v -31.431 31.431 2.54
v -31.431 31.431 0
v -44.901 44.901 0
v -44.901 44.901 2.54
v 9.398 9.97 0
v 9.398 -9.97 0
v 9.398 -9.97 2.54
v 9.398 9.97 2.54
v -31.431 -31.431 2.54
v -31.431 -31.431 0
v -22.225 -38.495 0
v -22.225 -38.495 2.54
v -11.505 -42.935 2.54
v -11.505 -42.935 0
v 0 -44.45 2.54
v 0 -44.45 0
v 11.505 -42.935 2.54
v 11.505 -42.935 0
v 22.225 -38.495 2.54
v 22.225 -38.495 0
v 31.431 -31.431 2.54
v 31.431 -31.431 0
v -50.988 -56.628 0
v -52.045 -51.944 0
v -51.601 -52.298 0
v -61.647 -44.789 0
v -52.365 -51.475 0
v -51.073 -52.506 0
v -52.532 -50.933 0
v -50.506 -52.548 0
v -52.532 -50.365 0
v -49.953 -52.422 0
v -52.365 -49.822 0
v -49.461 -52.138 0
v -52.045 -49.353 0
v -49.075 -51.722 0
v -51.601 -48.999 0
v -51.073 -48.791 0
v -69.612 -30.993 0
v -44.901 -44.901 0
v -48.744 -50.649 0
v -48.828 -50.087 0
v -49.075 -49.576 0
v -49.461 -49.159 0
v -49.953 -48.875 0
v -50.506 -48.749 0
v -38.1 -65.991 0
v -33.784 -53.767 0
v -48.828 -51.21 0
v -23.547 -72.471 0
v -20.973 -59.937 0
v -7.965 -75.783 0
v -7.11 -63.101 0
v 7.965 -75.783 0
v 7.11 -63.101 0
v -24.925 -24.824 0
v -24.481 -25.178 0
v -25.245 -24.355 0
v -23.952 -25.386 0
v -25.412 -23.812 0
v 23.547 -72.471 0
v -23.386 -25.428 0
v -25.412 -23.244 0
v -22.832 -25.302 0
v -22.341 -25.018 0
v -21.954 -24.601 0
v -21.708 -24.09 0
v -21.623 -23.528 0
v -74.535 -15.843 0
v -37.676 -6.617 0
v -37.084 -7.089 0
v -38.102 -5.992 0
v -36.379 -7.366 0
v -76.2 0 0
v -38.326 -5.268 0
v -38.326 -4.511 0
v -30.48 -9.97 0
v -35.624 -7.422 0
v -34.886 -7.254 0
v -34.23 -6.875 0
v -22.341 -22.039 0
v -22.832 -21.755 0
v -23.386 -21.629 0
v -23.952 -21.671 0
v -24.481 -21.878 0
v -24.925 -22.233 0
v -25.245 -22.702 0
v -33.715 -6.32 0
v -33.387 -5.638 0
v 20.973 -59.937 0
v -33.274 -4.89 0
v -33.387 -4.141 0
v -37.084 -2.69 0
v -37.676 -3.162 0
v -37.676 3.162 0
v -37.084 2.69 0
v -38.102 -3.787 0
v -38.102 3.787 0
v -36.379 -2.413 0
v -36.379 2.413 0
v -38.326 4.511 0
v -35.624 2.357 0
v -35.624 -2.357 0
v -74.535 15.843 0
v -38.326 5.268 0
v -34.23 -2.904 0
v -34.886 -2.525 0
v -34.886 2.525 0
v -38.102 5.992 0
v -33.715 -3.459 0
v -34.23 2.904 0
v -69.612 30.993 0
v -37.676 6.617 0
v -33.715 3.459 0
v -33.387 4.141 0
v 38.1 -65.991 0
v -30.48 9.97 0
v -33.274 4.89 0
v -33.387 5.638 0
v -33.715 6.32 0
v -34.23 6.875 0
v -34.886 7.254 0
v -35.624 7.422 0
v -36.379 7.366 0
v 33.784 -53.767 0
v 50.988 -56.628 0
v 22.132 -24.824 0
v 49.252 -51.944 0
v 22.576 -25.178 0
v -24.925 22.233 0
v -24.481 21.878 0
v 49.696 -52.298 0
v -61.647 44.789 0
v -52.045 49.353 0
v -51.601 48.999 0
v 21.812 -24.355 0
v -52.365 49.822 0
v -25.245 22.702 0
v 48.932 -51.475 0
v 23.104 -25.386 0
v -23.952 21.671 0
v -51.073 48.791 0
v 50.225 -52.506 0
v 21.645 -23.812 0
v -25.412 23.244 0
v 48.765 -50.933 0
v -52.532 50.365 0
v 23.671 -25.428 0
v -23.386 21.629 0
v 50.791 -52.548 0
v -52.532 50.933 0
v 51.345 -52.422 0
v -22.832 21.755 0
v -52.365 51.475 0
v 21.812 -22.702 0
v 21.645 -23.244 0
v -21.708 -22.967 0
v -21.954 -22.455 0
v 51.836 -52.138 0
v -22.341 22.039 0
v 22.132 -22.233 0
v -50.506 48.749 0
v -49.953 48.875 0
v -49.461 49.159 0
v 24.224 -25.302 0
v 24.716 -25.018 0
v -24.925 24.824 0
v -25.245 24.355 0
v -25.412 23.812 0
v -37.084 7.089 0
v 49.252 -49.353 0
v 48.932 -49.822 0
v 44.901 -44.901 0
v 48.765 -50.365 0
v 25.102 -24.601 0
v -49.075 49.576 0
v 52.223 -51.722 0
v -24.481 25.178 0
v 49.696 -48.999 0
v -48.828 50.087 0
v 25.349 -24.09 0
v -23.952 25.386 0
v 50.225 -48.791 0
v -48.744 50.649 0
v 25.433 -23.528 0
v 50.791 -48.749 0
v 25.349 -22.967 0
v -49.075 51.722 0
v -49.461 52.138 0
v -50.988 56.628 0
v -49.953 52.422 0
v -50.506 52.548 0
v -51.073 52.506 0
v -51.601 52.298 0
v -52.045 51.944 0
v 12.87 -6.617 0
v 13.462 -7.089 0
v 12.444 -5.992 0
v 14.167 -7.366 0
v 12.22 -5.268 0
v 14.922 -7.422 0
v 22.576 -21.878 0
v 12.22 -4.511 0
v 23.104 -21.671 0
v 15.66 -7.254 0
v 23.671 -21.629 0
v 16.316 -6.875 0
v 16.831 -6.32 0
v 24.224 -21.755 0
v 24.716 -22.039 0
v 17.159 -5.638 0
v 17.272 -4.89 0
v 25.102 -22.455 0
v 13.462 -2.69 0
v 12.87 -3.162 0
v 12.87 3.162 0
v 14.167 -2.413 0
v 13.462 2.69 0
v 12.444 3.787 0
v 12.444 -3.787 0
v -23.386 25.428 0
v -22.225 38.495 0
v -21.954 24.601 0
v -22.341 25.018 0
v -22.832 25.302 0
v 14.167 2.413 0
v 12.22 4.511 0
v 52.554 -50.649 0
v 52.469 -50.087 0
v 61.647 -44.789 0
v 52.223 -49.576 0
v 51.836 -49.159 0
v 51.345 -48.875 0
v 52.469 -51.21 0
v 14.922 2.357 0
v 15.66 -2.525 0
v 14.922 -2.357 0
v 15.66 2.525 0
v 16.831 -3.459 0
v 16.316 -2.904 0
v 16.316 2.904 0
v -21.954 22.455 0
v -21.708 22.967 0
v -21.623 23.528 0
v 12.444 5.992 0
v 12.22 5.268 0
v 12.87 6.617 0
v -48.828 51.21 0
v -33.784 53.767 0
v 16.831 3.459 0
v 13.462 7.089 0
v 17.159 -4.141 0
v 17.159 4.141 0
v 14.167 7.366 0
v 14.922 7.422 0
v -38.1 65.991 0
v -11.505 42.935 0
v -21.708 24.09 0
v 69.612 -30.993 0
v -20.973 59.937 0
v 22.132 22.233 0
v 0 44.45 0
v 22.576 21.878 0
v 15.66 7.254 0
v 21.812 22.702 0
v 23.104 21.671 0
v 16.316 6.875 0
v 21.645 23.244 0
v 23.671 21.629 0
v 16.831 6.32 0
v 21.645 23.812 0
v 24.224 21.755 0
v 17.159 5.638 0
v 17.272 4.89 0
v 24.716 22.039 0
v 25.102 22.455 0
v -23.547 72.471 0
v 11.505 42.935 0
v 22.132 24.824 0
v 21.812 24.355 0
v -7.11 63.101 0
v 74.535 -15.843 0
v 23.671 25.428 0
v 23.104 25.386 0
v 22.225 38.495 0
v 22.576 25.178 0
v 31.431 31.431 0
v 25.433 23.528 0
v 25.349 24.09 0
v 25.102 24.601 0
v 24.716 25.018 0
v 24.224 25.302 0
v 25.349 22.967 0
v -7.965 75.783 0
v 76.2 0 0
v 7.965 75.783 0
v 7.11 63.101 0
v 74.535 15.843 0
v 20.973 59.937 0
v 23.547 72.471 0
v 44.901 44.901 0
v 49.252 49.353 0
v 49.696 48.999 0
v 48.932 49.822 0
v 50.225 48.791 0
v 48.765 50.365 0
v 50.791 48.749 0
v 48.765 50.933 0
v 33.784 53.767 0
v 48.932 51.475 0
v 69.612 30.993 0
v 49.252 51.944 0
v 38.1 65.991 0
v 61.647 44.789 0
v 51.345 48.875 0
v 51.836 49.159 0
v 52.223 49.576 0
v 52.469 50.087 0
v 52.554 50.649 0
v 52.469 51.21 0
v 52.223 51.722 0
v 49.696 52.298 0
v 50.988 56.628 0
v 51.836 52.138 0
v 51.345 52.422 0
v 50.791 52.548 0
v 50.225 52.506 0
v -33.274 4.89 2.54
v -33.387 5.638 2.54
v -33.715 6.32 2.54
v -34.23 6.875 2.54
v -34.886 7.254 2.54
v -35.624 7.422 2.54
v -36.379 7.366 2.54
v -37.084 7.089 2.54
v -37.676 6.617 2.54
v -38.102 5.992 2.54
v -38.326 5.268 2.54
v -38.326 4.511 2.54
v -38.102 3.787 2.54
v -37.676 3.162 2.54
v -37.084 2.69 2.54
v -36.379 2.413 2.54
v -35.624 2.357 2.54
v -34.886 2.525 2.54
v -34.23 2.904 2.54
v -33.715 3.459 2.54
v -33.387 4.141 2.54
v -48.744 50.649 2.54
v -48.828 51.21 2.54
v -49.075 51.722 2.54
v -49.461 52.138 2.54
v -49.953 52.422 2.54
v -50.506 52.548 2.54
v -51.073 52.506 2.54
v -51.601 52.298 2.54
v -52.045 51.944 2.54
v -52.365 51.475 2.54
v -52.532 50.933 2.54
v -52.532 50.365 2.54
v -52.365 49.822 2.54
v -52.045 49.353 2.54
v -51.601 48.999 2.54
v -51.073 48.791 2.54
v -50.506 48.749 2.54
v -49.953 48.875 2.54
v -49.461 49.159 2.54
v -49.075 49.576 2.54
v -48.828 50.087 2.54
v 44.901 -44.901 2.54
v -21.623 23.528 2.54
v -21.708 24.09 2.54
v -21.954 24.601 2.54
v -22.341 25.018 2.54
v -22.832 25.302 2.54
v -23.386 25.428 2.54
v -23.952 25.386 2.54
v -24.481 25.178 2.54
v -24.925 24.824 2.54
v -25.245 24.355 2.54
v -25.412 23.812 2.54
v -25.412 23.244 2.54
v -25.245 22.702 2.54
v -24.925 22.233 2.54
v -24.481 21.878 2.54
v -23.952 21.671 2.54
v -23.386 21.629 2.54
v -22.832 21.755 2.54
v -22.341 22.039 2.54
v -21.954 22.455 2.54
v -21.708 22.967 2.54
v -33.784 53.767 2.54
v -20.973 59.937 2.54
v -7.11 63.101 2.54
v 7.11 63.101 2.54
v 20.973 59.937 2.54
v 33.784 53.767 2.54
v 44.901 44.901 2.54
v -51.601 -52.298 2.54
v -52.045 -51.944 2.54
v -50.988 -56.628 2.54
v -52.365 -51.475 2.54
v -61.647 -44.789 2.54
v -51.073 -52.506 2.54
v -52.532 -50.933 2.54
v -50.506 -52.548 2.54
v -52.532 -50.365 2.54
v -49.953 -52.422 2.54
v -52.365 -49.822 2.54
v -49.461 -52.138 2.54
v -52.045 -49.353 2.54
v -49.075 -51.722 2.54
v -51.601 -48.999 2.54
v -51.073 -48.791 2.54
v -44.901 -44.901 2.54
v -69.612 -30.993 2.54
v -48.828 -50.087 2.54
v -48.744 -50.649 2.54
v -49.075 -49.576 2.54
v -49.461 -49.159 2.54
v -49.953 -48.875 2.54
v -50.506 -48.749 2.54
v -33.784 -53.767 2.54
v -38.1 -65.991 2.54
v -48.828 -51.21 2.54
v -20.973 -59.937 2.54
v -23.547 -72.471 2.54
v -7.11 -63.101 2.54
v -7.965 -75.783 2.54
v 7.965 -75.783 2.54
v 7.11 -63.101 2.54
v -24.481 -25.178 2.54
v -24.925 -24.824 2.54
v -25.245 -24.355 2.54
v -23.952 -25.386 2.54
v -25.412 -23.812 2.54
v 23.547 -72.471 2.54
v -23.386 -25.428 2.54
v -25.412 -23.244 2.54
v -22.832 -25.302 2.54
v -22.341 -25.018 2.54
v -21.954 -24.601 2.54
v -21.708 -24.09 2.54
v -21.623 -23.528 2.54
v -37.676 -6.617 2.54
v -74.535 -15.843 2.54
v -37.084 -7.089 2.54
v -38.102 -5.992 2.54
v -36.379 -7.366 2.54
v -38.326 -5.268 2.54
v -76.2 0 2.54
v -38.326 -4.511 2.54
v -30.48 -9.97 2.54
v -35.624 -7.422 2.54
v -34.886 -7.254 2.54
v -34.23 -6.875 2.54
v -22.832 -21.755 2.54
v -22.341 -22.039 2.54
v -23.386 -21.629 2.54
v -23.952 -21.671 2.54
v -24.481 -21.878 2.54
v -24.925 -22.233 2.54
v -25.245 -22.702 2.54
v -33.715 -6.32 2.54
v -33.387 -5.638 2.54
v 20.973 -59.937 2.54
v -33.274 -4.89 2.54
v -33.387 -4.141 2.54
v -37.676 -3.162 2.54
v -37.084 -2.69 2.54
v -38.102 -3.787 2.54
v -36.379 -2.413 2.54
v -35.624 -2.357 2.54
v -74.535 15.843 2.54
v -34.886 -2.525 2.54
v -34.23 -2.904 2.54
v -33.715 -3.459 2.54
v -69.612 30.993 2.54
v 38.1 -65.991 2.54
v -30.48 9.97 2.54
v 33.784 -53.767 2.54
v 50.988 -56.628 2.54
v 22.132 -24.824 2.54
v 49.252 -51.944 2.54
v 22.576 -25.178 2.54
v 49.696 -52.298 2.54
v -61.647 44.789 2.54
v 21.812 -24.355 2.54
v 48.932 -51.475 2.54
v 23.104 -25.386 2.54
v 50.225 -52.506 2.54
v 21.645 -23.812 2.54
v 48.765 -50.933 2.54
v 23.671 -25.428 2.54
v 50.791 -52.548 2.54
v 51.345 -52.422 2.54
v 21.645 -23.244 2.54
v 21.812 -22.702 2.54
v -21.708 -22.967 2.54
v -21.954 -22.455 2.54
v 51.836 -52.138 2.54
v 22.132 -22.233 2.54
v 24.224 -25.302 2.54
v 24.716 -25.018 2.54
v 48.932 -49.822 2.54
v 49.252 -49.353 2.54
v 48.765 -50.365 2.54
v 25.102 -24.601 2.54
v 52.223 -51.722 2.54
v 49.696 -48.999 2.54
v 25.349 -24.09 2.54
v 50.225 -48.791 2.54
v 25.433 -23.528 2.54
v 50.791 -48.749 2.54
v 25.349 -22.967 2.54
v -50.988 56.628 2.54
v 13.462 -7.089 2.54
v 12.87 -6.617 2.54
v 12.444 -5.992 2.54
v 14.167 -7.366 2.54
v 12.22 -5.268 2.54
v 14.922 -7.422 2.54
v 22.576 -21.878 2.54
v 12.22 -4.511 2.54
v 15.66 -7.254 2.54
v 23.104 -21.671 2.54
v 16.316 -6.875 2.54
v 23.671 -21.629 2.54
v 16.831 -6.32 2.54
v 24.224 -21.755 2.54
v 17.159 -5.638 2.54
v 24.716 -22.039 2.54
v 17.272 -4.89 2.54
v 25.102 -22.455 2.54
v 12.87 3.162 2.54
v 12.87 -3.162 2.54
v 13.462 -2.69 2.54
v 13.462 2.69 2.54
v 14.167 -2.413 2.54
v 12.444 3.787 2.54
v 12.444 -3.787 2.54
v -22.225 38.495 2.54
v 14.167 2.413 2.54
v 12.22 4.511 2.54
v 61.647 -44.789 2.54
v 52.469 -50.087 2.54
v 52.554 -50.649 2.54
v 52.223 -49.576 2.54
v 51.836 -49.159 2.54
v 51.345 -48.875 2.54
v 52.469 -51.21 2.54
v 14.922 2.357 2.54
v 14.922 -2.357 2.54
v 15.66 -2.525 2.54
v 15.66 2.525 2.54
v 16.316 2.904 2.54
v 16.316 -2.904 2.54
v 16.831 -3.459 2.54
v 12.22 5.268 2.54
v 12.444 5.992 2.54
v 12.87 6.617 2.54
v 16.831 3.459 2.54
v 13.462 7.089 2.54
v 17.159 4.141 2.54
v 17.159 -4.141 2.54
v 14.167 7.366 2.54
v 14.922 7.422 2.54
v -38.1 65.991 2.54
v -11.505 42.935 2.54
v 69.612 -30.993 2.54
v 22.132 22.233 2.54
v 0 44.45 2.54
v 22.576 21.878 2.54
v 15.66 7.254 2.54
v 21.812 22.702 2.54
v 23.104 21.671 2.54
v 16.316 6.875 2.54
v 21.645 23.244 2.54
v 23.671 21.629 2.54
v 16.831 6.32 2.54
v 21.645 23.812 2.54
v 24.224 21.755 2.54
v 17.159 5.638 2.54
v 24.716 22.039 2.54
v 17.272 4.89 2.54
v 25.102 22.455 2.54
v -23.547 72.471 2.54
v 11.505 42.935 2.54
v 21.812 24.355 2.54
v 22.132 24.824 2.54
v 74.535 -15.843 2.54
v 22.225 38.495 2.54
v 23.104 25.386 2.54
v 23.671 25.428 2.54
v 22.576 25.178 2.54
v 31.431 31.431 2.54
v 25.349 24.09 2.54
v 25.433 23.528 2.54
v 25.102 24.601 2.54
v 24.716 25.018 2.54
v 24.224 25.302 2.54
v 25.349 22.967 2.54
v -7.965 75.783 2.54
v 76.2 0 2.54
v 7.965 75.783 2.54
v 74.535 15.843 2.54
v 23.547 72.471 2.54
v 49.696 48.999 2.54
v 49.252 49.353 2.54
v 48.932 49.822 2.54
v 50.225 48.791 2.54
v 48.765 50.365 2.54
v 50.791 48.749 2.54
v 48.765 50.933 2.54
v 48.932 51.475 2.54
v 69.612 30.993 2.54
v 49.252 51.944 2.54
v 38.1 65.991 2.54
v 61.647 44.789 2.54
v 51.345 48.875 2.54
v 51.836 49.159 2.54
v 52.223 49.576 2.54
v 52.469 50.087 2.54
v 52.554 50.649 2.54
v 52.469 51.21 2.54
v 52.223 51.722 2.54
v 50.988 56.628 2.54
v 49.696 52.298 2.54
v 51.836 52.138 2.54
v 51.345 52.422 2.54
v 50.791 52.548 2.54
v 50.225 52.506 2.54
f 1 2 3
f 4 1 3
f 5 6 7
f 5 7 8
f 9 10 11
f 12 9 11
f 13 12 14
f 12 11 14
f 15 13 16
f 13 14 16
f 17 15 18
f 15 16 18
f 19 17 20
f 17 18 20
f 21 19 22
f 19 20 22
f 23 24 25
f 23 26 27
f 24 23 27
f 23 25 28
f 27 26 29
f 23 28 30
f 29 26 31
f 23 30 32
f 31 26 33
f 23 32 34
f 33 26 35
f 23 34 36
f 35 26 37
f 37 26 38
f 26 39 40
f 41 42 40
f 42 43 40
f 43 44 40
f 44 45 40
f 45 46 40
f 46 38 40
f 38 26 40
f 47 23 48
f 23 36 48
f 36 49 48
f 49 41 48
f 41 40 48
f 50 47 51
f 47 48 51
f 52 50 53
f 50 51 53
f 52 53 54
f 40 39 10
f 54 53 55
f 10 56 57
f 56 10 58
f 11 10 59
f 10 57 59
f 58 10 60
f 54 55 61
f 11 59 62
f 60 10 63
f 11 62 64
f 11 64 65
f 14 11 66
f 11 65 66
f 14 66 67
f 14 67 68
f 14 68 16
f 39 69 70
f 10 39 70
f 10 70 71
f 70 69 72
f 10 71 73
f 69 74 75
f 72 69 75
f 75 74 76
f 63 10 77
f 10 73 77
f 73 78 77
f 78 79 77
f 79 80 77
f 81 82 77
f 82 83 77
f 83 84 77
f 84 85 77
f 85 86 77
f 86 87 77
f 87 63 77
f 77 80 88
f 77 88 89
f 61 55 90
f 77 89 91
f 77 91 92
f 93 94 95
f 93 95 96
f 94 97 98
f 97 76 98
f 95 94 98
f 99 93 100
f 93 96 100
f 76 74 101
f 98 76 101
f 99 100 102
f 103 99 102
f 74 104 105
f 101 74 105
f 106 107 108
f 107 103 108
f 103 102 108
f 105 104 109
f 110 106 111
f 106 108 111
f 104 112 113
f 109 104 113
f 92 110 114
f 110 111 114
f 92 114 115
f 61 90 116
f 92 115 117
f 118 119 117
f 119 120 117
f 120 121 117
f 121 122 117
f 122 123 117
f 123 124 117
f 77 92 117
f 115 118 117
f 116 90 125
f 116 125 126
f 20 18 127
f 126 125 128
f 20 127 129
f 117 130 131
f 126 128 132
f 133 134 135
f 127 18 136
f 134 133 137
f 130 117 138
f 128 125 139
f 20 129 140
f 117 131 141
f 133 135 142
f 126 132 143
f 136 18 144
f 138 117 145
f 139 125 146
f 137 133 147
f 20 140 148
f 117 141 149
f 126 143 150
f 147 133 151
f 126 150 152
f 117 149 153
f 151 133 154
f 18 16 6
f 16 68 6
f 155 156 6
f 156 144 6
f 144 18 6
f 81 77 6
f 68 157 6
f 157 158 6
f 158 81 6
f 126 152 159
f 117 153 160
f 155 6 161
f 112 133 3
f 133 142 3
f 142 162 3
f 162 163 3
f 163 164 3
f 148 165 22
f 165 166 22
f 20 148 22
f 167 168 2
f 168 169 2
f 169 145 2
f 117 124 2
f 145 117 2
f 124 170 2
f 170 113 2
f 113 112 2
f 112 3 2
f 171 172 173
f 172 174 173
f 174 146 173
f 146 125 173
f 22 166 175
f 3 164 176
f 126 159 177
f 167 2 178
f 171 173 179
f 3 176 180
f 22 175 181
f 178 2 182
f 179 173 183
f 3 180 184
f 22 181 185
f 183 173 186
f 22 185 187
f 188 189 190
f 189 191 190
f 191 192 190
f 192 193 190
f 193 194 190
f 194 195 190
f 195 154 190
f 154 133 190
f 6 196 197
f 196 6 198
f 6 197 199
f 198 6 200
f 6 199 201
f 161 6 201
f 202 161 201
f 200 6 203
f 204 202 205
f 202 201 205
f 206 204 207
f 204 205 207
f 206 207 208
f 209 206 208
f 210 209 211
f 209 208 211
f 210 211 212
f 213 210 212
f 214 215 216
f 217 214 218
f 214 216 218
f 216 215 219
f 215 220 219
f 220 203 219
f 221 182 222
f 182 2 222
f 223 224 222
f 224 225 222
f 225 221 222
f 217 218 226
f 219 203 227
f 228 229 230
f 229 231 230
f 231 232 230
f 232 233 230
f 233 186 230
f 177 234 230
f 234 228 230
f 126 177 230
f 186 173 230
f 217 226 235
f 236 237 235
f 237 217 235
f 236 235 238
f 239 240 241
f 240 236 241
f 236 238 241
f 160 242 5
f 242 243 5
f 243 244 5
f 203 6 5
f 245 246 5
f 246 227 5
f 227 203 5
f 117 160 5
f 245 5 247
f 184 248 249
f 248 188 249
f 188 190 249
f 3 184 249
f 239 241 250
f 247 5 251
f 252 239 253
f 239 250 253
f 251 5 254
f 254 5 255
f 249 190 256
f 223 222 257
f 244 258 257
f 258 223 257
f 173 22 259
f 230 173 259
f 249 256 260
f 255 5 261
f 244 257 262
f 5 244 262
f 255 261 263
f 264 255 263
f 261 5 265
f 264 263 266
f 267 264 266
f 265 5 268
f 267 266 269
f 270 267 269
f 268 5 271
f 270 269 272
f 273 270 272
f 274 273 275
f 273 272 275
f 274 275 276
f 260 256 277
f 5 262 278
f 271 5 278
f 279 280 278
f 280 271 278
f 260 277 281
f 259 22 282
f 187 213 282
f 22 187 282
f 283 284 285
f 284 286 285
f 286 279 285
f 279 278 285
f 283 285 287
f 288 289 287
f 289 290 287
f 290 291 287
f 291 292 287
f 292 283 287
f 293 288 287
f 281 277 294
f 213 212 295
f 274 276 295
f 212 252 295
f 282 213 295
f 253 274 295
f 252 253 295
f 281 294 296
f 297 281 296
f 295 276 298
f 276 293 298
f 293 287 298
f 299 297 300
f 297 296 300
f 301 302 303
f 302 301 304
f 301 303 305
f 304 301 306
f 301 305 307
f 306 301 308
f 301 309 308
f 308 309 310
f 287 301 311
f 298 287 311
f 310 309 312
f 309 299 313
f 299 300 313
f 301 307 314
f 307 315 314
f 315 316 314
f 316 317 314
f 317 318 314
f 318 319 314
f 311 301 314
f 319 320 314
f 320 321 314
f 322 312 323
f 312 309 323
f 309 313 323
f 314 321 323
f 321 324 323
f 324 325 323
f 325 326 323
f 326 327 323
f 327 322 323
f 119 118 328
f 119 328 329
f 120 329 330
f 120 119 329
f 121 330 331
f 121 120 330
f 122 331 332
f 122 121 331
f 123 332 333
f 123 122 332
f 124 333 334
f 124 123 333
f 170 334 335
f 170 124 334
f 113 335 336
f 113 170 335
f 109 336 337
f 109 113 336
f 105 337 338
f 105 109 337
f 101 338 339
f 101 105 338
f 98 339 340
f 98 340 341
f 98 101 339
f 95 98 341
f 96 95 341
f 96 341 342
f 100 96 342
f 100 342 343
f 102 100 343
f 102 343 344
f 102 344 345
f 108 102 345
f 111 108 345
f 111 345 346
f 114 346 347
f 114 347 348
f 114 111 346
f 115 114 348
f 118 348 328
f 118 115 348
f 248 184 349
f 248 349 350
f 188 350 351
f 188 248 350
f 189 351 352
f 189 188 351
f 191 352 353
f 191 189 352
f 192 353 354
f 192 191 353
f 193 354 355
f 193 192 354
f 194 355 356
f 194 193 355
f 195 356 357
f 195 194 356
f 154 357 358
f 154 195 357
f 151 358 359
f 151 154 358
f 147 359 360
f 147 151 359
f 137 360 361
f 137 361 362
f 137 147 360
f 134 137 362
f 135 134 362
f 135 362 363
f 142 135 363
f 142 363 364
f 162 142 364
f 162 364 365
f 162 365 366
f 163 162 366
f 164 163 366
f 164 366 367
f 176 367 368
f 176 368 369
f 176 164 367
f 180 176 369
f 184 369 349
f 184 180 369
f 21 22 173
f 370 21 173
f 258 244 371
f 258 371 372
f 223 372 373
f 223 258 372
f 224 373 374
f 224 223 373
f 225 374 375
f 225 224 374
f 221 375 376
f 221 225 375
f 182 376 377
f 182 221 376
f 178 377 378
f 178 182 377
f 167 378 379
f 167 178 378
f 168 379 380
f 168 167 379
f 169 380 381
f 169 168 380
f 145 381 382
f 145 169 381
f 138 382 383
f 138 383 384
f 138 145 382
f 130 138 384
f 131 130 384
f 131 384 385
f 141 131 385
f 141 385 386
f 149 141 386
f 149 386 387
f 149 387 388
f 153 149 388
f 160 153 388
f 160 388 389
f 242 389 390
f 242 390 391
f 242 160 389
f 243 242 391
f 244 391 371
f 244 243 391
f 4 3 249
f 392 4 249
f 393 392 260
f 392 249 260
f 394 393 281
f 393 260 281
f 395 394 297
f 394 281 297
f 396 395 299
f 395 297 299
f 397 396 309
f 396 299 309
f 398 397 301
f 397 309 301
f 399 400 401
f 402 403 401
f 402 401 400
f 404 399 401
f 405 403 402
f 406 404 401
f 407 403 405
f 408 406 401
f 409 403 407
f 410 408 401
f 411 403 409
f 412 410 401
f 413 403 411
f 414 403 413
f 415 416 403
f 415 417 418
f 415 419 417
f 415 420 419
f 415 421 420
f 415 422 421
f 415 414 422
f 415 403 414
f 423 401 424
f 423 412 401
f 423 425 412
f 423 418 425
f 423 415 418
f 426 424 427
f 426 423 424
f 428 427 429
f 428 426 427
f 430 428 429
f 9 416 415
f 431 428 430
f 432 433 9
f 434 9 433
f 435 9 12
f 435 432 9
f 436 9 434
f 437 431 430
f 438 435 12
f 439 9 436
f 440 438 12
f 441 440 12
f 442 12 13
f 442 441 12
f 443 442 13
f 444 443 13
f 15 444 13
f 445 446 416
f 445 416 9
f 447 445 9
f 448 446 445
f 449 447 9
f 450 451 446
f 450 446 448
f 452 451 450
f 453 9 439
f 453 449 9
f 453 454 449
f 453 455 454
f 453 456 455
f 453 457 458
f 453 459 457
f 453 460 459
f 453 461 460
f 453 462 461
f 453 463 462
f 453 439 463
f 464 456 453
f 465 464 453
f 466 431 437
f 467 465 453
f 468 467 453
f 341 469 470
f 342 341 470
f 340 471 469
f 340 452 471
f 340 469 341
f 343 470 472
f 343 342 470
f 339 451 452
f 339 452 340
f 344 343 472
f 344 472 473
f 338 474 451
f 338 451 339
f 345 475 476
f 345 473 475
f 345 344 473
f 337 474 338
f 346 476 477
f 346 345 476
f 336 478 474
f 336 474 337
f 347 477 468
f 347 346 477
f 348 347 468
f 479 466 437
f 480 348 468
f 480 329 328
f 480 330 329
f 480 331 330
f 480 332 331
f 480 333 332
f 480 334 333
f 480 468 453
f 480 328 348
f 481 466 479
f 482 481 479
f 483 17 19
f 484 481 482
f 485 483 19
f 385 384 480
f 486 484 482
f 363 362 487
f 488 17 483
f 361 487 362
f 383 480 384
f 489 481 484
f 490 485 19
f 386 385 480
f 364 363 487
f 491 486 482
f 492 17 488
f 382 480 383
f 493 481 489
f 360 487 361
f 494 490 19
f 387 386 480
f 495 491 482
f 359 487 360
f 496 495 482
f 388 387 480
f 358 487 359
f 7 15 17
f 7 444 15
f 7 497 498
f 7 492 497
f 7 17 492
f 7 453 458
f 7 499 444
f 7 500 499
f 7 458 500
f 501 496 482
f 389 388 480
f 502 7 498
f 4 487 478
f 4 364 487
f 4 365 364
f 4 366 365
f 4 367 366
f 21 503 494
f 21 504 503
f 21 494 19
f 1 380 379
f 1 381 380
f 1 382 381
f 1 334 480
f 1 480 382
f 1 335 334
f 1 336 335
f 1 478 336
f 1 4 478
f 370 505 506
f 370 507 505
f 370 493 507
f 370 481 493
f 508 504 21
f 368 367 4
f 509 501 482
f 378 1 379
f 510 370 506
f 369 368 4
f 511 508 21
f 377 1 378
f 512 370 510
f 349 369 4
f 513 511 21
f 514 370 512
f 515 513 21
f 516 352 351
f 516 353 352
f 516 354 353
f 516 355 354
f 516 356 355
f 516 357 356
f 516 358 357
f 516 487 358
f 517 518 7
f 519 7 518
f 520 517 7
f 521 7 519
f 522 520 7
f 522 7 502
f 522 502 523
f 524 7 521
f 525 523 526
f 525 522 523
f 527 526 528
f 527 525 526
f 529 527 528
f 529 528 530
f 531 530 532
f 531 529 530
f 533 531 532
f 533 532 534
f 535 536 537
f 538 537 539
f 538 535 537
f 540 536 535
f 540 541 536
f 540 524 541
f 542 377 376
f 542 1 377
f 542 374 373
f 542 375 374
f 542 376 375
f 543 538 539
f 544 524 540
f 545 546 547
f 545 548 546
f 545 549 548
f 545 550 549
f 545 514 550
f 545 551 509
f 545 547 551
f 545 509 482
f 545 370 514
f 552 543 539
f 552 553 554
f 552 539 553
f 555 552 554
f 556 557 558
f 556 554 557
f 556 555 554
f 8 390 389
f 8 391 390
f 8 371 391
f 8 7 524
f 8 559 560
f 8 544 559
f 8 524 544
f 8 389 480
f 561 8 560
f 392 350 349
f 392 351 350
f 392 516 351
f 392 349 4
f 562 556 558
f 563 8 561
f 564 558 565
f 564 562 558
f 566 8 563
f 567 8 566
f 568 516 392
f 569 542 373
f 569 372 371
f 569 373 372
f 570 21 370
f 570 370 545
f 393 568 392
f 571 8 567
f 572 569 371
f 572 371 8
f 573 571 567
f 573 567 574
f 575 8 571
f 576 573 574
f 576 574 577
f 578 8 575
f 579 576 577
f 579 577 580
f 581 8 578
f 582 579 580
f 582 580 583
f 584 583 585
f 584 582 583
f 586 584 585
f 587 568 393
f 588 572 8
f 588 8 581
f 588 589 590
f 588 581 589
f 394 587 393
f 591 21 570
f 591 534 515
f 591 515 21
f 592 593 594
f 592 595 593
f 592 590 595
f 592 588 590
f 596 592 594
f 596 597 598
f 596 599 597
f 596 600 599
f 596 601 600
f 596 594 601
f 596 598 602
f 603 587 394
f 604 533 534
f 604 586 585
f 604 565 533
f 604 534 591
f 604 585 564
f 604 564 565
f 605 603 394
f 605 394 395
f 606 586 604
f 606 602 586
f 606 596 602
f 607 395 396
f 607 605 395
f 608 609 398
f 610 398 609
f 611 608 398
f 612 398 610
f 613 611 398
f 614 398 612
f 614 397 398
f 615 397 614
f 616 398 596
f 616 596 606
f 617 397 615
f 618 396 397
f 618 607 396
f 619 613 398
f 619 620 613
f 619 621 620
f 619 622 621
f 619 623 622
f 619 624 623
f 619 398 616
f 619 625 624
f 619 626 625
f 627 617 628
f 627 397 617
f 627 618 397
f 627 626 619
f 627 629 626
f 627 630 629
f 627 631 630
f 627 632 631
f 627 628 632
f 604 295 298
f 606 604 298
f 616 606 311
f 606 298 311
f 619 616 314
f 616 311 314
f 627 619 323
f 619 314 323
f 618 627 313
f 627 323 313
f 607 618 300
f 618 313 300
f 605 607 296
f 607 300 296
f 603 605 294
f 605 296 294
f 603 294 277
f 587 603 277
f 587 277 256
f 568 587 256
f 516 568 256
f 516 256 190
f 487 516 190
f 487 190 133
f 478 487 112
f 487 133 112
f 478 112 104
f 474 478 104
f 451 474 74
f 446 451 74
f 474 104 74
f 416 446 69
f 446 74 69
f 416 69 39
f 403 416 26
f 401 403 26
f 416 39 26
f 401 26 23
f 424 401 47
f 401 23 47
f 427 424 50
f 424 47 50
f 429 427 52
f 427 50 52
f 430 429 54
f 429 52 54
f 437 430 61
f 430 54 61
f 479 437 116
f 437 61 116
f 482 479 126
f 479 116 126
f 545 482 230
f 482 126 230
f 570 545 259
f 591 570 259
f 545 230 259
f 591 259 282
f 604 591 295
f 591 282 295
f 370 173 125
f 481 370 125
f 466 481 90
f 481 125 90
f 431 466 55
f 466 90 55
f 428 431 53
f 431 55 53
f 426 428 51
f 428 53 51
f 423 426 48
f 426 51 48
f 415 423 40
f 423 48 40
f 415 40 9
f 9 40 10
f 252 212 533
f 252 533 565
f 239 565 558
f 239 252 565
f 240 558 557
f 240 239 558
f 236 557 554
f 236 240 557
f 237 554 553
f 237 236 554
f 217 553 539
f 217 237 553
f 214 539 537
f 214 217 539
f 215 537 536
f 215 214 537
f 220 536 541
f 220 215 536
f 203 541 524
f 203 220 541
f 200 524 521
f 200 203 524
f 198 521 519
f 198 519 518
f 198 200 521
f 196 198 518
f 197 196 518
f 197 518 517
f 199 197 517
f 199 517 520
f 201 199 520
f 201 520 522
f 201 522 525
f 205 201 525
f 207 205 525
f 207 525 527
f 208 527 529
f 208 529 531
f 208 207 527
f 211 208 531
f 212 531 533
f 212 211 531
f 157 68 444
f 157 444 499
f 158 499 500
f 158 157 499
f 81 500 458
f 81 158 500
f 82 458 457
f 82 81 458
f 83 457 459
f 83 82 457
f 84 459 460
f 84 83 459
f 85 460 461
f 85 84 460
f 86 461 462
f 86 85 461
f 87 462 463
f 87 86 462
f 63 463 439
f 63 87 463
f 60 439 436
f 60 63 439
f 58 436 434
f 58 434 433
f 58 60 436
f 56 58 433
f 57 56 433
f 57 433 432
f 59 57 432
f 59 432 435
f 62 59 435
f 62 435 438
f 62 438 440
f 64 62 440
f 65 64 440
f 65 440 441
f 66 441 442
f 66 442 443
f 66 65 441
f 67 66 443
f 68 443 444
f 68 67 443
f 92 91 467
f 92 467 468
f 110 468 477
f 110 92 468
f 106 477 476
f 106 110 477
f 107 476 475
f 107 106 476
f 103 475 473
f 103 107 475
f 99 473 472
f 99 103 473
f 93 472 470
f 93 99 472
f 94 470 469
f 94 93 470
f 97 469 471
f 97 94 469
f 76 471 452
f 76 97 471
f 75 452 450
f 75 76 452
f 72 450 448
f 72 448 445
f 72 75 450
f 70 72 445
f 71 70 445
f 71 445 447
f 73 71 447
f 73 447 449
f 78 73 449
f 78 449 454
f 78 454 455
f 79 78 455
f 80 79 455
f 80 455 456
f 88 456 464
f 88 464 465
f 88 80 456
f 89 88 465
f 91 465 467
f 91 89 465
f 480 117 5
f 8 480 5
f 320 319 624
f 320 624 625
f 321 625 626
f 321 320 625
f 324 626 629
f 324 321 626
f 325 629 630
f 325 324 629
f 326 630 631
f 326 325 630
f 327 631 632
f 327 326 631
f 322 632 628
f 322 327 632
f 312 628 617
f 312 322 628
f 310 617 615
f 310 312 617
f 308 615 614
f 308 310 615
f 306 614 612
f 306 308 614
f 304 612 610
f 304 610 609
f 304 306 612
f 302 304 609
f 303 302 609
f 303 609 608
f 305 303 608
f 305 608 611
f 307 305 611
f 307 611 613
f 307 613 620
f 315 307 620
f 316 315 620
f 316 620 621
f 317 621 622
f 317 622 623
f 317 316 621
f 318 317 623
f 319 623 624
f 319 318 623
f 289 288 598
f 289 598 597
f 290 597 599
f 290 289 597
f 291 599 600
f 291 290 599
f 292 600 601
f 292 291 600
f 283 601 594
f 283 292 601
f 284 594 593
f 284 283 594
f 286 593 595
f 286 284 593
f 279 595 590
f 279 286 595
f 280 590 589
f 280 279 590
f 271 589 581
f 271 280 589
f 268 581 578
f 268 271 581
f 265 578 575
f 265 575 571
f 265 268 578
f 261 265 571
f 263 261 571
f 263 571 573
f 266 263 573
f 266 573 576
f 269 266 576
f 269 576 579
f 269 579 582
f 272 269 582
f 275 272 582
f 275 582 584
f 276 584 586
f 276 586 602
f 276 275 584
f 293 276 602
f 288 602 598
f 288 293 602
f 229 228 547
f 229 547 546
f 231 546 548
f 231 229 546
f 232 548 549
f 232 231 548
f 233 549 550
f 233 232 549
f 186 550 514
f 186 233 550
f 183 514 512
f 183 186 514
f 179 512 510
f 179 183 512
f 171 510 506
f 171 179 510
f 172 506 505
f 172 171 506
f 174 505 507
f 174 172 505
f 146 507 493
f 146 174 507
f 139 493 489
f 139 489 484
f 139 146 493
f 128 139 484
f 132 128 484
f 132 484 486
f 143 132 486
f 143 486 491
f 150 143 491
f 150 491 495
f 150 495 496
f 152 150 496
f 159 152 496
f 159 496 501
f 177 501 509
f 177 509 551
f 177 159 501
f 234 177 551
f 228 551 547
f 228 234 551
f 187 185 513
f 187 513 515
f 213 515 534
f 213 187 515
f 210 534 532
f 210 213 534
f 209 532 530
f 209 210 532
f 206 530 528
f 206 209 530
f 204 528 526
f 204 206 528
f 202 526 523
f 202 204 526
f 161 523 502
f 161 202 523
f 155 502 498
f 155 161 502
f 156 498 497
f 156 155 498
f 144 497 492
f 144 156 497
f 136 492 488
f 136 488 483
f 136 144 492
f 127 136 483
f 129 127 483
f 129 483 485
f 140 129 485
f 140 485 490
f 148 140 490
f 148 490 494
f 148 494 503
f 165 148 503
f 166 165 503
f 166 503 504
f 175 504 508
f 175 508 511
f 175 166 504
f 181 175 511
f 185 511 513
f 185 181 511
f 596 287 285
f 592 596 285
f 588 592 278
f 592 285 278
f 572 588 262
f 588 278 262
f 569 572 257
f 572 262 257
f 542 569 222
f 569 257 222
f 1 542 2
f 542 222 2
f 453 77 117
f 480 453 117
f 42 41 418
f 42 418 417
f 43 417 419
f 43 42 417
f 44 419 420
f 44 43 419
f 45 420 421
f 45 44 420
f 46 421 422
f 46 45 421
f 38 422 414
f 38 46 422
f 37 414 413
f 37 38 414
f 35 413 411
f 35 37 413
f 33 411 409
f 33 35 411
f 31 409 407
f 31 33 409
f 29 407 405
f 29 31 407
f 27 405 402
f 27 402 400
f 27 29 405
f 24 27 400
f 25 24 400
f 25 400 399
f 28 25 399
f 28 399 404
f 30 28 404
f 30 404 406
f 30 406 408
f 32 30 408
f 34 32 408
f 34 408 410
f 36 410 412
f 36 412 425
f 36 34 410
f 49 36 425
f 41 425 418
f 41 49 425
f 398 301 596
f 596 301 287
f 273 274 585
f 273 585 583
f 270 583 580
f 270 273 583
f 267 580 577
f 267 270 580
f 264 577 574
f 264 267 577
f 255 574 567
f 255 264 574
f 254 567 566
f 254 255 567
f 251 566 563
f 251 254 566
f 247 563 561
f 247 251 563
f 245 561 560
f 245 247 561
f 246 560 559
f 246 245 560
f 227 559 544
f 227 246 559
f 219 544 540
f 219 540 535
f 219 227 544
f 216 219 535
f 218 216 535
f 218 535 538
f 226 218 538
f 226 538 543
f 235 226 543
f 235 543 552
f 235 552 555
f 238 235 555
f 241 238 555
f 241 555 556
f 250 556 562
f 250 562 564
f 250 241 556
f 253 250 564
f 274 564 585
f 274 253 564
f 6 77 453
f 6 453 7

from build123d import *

# Parameters (mm, degrees)
SKETCH1_R           = 76.2
SKETCH1_R_2         = 2.54
SKETCH1_R_3         = 1.905
SKETCH1_W           = 39.878
SKETCH1_H           = 19.939
BOSS_EXTRUDE1_DEPTH = 2.54


with BuildPart() as part:
    # Sketch1 → Boss-Extrude1 (new body)
    with BuildSketch(Plane.XY):
        Circle(SKETCH1_R)
        with Locations((14.732, -4.8895)):
            Circle(SKETCH1_R_2, mode=Mode.SUBTRACT)
        with Locations((14.732, 4.8895)):
            Circle(SKETCH1_R_2, mode=Mode.SUBTRACT)
        with Locations((-35.814, 4.8895)):
            Circle(SKETCH1_R_2, mode=Mode.SUBTRACT)
        with Locations((-35.814, -4.8895)):
            Circle(SKETCH1_R_2, mode=Mode.SUBTRACT)
        with Locations((23.528271037, 23.528271037)):
            Circle(SKETCH1_R_3, mode=Mode.SUBTRACT)
        with Locations((23.528271037, -23.528271037)):
            Circle(SKETCH1_R_3, mode=Mode.SUBTRACT)
        with Locations((-23.528271037, -23.528271037)):
            Circle(SKETCH1_R_3, mode=Mode.SUBTRACT)
        with Locations((-23.528271037, 23.528271037)):
            Circle(SKETCH1_R_3, mode=Mode.SUBTRACT)
        with Locations((50.648644523, 50.648644523)):
            Circle(SKETCH1_R_3, mode=Mode.SUBTRACT)
        with Locations((50.648644523, -50.648644523)):
            Circle(SKETCH1_R_3, mode=Mode.SUBTRACT)
        with Locations((-50.648644523, -50.648644523)):
            Circle(SKETCH1_R_3, mode=Mode.SUBTRACT)
        with Locations((-50.648644523, 50.648644523)):
            Circle(SKETCH1_R_3, mode=Mode.SUBTRACT)
        with Locations((-10.541, 0)):
            Rectangle(SKETCH1_W, SKETCH1_H, mode=Mode.SUBTRACT)
        with BuildLine():
            Line((-44.901280605, -44.901280605), (-31.430896424, -31.430896424))
            ThreePointArc((-31.430896424, -31.430896424), (0, -44.45), (31.430896424, -31.430896424))
            Line((31.430896424, -31.430896424), (44.901280605, -44.901280605))
            ThreePointArc((44.901280605, -44.901280605), (0, -63.5), (-44.901280605, -44.901280605))
        make_face(mode=Mode.SUBTRACT)
        with BuildLine():
            Line((44.901280605, 44.901280605), (31.430896424, 31.430896424))
            ThreePointArc((31.430896424, 31.430896424), (0, 44.45), (-31.430896424, 31.430896424))
            Line((-31.430896424, 31.430896424), (-44.901280605, 44.901280605))
            ThreePointArc((-44.901280605, 44.901280605), (0, 63.5), (44.901280605, 44.901280605))
        make_face(mode=Mode.SUBTRACT)
    extrude(amount=BOSS_EXTRUDE1_DEPTH)


solid = part.part
